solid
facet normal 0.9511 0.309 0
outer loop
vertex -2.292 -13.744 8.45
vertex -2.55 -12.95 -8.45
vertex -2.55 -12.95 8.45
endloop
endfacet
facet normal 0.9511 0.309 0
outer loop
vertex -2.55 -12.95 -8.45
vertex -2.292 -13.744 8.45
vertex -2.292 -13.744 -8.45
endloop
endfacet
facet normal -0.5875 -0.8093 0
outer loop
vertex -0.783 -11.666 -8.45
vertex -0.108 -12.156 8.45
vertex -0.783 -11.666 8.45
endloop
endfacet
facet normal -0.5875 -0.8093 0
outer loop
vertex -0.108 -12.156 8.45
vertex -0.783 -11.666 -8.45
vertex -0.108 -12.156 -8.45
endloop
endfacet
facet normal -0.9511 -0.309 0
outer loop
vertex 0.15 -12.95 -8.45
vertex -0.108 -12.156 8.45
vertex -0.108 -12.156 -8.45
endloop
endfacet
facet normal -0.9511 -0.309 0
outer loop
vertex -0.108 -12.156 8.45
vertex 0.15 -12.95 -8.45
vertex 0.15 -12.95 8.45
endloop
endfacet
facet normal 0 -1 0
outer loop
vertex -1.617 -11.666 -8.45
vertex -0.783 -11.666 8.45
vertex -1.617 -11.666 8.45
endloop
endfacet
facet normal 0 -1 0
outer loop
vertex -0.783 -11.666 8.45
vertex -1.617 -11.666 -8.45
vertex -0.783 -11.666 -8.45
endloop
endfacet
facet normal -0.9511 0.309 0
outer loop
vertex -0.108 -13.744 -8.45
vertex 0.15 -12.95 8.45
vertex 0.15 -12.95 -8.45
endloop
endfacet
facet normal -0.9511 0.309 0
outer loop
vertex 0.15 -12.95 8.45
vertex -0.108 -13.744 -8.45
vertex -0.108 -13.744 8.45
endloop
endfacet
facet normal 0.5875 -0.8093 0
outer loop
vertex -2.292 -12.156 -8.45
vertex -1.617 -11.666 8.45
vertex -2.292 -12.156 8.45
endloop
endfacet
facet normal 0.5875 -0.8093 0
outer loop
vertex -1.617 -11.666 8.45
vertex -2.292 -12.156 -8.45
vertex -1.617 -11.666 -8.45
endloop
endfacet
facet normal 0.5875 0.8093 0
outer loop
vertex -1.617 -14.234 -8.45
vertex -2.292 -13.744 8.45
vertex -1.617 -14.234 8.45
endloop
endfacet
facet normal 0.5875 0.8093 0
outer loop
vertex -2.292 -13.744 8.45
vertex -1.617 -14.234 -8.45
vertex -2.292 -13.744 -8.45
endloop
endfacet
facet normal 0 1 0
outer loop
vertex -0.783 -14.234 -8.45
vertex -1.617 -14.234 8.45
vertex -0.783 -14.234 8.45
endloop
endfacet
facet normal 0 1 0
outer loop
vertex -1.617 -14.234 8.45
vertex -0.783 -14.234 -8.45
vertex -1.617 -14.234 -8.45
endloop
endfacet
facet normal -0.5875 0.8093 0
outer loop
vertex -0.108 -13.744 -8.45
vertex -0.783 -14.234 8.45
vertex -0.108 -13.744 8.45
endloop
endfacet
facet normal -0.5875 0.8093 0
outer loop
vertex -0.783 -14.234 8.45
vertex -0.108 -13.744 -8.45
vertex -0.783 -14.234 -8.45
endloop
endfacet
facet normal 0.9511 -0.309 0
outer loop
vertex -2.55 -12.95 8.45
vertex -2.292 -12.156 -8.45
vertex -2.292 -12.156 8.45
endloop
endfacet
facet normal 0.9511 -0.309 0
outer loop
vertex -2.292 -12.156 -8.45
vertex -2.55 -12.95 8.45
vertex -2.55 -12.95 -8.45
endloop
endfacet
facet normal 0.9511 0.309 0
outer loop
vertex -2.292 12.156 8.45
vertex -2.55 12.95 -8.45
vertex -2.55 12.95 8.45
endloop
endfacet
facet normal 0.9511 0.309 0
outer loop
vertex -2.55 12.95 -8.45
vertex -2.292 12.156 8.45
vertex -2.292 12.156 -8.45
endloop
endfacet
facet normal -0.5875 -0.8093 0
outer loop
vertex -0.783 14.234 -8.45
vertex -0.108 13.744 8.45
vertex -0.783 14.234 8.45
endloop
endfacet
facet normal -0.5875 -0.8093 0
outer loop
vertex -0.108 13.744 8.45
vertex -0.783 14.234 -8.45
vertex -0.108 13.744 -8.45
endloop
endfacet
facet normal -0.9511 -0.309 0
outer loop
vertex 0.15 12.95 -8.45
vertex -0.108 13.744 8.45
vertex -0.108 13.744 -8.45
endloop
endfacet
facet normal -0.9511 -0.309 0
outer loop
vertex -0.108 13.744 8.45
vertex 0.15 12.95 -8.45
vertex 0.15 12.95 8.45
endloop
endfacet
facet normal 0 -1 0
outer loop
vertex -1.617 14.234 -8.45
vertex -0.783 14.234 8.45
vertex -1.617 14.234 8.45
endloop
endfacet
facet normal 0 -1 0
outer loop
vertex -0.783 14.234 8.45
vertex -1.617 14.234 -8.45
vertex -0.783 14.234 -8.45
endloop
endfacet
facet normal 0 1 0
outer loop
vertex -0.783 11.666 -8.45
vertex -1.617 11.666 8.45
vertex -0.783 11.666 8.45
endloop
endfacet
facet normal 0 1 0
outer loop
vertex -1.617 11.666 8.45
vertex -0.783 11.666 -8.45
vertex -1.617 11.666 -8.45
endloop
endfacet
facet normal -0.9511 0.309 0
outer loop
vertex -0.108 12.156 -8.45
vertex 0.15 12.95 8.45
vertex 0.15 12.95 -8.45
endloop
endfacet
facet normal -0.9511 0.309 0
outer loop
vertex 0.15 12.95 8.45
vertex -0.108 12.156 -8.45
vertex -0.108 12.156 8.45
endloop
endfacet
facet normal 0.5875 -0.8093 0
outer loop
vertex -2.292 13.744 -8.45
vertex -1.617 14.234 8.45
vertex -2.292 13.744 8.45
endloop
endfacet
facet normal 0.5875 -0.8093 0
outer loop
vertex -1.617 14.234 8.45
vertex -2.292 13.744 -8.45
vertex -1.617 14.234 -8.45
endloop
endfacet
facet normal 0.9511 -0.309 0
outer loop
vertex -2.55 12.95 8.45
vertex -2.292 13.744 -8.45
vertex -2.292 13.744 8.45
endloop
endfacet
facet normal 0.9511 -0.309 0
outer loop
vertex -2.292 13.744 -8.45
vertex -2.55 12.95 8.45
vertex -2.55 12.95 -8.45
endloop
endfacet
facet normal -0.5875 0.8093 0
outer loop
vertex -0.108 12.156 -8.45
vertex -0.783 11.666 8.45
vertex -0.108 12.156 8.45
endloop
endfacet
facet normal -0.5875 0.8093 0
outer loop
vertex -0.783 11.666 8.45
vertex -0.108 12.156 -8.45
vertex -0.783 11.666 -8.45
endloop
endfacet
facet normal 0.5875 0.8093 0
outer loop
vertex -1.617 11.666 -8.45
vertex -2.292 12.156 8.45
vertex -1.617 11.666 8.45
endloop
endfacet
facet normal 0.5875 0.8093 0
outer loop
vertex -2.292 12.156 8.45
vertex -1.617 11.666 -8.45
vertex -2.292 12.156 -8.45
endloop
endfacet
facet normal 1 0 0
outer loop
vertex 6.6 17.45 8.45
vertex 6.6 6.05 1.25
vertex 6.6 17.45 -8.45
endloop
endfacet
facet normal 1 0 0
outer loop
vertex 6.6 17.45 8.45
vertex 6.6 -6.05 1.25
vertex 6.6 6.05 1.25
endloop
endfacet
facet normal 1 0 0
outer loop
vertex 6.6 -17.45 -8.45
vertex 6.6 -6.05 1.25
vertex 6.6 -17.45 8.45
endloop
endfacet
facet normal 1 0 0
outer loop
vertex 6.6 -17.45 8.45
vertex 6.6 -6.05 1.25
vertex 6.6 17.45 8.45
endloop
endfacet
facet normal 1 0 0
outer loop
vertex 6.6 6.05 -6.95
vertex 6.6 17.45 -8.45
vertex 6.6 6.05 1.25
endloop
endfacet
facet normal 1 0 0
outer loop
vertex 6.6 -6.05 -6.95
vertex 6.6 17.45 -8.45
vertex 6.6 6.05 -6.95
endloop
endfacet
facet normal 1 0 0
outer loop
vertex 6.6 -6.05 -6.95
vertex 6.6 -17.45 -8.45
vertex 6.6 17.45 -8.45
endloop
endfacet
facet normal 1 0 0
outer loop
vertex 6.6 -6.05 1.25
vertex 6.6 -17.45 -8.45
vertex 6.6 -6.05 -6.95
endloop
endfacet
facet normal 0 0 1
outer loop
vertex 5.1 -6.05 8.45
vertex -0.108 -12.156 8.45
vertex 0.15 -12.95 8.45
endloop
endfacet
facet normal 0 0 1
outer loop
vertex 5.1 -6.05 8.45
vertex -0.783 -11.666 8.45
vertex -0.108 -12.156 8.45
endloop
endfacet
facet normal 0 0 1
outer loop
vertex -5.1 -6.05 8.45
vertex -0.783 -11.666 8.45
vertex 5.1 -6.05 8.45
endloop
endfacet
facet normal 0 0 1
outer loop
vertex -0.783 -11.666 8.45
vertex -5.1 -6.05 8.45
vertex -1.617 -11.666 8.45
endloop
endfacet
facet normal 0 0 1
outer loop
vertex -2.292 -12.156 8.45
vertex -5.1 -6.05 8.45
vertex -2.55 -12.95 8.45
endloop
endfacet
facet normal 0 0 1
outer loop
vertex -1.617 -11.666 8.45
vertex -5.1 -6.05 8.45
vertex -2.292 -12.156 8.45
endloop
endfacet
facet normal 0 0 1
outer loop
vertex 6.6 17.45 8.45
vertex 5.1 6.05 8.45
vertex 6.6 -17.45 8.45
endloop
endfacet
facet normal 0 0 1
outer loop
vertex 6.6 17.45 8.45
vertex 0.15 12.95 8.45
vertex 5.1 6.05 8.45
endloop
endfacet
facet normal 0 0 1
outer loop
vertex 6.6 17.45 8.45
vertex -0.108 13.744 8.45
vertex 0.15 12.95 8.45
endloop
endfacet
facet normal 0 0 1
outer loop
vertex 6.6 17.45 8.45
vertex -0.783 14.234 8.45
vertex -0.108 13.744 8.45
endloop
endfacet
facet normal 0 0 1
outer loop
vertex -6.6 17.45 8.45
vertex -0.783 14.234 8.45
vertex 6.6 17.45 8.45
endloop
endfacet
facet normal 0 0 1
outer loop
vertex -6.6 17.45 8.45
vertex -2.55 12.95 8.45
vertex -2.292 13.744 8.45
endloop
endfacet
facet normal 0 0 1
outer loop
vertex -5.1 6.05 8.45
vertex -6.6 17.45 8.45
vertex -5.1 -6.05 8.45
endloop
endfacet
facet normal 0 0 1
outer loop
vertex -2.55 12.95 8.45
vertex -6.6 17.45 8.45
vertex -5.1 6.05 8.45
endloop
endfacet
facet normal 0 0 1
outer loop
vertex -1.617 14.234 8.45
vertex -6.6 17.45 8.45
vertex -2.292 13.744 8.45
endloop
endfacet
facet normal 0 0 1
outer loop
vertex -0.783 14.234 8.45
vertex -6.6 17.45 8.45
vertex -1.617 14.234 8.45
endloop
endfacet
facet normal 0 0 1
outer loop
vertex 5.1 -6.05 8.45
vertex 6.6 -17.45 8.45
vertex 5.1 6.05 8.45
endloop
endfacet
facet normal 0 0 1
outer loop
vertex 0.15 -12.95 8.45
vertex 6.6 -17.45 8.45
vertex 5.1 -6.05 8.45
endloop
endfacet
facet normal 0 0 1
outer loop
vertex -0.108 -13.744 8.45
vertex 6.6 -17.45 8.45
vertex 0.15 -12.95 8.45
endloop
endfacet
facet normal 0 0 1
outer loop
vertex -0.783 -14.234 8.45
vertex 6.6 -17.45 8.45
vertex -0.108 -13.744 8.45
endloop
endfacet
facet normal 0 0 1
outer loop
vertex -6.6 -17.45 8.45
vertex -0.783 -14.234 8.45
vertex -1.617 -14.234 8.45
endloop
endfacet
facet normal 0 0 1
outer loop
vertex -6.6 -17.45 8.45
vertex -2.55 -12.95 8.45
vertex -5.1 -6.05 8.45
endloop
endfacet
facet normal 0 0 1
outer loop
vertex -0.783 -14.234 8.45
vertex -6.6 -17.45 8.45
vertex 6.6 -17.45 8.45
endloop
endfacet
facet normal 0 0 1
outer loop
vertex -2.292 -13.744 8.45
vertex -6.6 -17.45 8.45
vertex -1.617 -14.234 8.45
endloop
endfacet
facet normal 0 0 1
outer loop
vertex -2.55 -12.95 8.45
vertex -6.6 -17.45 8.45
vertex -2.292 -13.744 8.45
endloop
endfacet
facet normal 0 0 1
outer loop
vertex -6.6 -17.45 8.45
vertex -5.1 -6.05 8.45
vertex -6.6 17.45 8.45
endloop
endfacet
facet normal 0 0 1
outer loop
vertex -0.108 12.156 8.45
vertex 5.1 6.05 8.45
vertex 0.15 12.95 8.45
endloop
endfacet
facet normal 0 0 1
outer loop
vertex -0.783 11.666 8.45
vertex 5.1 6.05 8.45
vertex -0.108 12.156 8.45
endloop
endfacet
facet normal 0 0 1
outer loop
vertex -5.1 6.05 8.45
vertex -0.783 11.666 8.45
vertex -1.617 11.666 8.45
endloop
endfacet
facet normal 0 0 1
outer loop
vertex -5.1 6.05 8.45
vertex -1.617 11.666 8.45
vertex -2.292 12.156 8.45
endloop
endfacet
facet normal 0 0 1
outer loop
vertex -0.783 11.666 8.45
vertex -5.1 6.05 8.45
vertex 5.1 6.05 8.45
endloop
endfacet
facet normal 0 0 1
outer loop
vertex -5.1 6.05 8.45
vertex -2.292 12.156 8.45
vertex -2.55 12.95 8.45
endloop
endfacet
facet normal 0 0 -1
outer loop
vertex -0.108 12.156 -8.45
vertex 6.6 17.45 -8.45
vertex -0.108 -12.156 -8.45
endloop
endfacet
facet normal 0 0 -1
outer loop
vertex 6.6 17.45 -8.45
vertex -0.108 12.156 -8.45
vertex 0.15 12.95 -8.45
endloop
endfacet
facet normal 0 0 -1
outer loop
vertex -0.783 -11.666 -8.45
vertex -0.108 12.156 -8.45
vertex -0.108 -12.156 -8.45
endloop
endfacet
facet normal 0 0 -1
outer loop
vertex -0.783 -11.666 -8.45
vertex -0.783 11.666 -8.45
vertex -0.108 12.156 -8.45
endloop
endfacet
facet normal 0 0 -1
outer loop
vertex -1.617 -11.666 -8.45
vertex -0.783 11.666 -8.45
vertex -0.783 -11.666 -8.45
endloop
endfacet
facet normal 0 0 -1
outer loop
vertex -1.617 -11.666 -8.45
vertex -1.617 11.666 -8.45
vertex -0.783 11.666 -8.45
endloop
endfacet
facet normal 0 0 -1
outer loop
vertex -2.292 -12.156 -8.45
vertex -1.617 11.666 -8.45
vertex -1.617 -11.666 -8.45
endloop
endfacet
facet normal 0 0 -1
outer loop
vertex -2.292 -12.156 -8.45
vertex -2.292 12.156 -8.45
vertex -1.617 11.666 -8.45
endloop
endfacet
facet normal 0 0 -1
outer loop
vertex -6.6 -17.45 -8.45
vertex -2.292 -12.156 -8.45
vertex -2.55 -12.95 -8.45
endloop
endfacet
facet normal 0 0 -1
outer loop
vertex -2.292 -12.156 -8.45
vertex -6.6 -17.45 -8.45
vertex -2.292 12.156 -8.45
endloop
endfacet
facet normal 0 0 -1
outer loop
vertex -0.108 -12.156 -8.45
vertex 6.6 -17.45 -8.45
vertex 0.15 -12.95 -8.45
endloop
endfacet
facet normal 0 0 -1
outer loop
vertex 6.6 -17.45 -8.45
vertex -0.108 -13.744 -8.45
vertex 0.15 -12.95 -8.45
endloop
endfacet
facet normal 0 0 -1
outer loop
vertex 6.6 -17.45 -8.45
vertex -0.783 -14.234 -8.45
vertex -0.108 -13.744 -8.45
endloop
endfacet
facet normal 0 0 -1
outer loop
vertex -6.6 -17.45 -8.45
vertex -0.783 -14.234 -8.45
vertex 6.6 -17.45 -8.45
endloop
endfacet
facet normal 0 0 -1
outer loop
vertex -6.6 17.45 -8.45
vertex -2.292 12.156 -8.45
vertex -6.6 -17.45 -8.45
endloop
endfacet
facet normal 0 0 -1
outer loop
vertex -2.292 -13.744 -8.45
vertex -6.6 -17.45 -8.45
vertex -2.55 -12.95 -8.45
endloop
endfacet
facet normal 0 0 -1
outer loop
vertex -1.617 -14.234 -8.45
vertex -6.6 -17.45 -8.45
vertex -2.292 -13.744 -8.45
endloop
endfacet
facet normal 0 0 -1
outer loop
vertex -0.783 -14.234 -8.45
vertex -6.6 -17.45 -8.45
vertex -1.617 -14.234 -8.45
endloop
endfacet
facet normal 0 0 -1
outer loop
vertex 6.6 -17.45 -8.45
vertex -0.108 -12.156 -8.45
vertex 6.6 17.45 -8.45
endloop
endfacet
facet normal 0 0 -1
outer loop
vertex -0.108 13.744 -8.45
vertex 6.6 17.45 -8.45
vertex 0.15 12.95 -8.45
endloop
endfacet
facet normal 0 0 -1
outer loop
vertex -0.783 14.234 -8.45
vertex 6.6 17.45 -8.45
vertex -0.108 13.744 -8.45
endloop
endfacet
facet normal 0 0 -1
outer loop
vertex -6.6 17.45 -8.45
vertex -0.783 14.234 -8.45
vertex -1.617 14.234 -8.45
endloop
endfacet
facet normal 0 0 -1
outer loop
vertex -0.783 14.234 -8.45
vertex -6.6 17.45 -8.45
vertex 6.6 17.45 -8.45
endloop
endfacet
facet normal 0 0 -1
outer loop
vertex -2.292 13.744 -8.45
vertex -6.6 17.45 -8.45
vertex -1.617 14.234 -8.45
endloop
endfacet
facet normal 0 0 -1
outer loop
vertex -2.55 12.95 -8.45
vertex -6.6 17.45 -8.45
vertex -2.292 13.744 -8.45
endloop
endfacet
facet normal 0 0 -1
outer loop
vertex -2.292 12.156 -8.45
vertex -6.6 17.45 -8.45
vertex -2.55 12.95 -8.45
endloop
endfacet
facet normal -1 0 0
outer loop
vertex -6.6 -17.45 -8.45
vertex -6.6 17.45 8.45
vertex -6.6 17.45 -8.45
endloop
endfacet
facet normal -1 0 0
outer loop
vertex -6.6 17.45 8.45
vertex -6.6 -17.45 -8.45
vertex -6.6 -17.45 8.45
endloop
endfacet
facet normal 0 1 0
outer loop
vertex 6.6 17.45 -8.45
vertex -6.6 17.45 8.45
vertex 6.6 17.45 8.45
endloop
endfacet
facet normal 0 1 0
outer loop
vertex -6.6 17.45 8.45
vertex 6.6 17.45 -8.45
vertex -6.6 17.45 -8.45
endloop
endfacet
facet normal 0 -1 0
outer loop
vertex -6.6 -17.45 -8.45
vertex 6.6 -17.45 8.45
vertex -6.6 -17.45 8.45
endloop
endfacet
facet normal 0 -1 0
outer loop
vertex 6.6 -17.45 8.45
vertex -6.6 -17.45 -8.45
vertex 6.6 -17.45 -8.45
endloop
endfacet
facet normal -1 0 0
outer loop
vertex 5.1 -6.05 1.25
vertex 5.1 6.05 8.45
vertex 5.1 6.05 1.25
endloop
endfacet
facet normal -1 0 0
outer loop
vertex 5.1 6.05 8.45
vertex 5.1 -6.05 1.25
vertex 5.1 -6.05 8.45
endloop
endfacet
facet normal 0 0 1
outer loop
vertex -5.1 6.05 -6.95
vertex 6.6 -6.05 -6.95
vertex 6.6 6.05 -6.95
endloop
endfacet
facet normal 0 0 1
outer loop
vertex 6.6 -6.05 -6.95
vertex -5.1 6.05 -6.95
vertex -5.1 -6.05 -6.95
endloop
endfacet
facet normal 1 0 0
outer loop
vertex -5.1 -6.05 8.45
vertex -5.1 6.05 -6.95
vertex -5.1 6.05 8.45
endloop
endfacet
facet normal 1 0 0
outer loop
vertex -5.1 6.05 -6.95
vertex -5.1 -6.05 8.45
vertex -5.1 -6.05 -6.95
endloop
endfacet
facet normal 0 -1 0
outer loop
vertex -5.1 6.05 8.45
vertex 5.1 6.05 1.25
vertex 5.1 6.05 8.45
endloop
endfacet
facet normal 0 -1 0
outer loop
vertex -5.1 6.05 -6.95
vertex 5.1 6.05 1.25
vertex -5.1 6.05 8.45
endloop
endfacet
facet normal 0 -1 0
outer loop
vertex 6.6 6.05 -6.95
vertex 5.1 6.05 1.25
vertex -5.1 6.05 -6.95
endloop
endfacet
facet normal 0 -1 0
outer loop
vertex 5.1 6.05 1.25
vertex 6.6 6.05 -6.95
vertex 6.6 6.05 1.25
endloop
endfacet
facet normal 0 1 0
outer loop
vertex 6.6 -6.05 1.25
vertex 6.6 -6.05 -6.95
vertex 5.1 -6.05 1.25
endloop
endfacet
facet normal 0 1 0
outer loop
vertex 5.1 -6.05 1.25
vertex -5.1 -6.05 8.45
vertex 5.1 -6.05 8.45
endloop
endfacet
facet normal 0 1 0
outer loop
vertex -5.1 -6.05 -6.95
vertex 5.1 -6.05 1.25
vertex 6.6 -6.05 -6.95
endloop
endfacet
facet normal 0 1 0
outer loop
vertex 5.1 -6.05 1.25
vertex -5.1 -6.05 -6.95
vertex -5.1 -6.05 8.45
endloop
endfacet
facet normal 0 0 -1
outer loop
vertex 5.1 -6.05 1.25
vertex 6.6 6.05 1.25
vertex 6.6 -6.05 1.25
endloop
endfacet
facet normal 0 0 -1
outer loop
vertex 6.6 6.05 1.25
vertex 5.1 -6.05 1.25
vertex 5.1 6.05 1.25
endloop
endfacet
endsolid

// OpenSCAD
usb_b = [10.2, 12.1, 16.4];
wall_t = 1;
t = 1.5;
gap = usb_b.z/2;
hole = [-1.2, 6.9, usb_b.z*100];
hole_r = 2.7/2;

difference(){
    union(){
        cube(usb_b + [2*t, 2*t + (hole.y + 2*t)*2, t-wall_t], center=true);
    }
    translate([0, 0, t/2])
    cube(usb_b + [0, 0, -wall_t], center=true);
    translate([t, 0, t/2 - (usb_b.z - wall_t)/2 + gap/2])
    cube([usb_b.x, usb_b.y, gap], center=true);
    for (y = [-1, 1]){
        translate([hole.x, (hole.y + usb_b.y/2)*y, -hole.z/2])
        cylinder(hole.z, hole_r, hole_r, $fn=10);
    }
}
